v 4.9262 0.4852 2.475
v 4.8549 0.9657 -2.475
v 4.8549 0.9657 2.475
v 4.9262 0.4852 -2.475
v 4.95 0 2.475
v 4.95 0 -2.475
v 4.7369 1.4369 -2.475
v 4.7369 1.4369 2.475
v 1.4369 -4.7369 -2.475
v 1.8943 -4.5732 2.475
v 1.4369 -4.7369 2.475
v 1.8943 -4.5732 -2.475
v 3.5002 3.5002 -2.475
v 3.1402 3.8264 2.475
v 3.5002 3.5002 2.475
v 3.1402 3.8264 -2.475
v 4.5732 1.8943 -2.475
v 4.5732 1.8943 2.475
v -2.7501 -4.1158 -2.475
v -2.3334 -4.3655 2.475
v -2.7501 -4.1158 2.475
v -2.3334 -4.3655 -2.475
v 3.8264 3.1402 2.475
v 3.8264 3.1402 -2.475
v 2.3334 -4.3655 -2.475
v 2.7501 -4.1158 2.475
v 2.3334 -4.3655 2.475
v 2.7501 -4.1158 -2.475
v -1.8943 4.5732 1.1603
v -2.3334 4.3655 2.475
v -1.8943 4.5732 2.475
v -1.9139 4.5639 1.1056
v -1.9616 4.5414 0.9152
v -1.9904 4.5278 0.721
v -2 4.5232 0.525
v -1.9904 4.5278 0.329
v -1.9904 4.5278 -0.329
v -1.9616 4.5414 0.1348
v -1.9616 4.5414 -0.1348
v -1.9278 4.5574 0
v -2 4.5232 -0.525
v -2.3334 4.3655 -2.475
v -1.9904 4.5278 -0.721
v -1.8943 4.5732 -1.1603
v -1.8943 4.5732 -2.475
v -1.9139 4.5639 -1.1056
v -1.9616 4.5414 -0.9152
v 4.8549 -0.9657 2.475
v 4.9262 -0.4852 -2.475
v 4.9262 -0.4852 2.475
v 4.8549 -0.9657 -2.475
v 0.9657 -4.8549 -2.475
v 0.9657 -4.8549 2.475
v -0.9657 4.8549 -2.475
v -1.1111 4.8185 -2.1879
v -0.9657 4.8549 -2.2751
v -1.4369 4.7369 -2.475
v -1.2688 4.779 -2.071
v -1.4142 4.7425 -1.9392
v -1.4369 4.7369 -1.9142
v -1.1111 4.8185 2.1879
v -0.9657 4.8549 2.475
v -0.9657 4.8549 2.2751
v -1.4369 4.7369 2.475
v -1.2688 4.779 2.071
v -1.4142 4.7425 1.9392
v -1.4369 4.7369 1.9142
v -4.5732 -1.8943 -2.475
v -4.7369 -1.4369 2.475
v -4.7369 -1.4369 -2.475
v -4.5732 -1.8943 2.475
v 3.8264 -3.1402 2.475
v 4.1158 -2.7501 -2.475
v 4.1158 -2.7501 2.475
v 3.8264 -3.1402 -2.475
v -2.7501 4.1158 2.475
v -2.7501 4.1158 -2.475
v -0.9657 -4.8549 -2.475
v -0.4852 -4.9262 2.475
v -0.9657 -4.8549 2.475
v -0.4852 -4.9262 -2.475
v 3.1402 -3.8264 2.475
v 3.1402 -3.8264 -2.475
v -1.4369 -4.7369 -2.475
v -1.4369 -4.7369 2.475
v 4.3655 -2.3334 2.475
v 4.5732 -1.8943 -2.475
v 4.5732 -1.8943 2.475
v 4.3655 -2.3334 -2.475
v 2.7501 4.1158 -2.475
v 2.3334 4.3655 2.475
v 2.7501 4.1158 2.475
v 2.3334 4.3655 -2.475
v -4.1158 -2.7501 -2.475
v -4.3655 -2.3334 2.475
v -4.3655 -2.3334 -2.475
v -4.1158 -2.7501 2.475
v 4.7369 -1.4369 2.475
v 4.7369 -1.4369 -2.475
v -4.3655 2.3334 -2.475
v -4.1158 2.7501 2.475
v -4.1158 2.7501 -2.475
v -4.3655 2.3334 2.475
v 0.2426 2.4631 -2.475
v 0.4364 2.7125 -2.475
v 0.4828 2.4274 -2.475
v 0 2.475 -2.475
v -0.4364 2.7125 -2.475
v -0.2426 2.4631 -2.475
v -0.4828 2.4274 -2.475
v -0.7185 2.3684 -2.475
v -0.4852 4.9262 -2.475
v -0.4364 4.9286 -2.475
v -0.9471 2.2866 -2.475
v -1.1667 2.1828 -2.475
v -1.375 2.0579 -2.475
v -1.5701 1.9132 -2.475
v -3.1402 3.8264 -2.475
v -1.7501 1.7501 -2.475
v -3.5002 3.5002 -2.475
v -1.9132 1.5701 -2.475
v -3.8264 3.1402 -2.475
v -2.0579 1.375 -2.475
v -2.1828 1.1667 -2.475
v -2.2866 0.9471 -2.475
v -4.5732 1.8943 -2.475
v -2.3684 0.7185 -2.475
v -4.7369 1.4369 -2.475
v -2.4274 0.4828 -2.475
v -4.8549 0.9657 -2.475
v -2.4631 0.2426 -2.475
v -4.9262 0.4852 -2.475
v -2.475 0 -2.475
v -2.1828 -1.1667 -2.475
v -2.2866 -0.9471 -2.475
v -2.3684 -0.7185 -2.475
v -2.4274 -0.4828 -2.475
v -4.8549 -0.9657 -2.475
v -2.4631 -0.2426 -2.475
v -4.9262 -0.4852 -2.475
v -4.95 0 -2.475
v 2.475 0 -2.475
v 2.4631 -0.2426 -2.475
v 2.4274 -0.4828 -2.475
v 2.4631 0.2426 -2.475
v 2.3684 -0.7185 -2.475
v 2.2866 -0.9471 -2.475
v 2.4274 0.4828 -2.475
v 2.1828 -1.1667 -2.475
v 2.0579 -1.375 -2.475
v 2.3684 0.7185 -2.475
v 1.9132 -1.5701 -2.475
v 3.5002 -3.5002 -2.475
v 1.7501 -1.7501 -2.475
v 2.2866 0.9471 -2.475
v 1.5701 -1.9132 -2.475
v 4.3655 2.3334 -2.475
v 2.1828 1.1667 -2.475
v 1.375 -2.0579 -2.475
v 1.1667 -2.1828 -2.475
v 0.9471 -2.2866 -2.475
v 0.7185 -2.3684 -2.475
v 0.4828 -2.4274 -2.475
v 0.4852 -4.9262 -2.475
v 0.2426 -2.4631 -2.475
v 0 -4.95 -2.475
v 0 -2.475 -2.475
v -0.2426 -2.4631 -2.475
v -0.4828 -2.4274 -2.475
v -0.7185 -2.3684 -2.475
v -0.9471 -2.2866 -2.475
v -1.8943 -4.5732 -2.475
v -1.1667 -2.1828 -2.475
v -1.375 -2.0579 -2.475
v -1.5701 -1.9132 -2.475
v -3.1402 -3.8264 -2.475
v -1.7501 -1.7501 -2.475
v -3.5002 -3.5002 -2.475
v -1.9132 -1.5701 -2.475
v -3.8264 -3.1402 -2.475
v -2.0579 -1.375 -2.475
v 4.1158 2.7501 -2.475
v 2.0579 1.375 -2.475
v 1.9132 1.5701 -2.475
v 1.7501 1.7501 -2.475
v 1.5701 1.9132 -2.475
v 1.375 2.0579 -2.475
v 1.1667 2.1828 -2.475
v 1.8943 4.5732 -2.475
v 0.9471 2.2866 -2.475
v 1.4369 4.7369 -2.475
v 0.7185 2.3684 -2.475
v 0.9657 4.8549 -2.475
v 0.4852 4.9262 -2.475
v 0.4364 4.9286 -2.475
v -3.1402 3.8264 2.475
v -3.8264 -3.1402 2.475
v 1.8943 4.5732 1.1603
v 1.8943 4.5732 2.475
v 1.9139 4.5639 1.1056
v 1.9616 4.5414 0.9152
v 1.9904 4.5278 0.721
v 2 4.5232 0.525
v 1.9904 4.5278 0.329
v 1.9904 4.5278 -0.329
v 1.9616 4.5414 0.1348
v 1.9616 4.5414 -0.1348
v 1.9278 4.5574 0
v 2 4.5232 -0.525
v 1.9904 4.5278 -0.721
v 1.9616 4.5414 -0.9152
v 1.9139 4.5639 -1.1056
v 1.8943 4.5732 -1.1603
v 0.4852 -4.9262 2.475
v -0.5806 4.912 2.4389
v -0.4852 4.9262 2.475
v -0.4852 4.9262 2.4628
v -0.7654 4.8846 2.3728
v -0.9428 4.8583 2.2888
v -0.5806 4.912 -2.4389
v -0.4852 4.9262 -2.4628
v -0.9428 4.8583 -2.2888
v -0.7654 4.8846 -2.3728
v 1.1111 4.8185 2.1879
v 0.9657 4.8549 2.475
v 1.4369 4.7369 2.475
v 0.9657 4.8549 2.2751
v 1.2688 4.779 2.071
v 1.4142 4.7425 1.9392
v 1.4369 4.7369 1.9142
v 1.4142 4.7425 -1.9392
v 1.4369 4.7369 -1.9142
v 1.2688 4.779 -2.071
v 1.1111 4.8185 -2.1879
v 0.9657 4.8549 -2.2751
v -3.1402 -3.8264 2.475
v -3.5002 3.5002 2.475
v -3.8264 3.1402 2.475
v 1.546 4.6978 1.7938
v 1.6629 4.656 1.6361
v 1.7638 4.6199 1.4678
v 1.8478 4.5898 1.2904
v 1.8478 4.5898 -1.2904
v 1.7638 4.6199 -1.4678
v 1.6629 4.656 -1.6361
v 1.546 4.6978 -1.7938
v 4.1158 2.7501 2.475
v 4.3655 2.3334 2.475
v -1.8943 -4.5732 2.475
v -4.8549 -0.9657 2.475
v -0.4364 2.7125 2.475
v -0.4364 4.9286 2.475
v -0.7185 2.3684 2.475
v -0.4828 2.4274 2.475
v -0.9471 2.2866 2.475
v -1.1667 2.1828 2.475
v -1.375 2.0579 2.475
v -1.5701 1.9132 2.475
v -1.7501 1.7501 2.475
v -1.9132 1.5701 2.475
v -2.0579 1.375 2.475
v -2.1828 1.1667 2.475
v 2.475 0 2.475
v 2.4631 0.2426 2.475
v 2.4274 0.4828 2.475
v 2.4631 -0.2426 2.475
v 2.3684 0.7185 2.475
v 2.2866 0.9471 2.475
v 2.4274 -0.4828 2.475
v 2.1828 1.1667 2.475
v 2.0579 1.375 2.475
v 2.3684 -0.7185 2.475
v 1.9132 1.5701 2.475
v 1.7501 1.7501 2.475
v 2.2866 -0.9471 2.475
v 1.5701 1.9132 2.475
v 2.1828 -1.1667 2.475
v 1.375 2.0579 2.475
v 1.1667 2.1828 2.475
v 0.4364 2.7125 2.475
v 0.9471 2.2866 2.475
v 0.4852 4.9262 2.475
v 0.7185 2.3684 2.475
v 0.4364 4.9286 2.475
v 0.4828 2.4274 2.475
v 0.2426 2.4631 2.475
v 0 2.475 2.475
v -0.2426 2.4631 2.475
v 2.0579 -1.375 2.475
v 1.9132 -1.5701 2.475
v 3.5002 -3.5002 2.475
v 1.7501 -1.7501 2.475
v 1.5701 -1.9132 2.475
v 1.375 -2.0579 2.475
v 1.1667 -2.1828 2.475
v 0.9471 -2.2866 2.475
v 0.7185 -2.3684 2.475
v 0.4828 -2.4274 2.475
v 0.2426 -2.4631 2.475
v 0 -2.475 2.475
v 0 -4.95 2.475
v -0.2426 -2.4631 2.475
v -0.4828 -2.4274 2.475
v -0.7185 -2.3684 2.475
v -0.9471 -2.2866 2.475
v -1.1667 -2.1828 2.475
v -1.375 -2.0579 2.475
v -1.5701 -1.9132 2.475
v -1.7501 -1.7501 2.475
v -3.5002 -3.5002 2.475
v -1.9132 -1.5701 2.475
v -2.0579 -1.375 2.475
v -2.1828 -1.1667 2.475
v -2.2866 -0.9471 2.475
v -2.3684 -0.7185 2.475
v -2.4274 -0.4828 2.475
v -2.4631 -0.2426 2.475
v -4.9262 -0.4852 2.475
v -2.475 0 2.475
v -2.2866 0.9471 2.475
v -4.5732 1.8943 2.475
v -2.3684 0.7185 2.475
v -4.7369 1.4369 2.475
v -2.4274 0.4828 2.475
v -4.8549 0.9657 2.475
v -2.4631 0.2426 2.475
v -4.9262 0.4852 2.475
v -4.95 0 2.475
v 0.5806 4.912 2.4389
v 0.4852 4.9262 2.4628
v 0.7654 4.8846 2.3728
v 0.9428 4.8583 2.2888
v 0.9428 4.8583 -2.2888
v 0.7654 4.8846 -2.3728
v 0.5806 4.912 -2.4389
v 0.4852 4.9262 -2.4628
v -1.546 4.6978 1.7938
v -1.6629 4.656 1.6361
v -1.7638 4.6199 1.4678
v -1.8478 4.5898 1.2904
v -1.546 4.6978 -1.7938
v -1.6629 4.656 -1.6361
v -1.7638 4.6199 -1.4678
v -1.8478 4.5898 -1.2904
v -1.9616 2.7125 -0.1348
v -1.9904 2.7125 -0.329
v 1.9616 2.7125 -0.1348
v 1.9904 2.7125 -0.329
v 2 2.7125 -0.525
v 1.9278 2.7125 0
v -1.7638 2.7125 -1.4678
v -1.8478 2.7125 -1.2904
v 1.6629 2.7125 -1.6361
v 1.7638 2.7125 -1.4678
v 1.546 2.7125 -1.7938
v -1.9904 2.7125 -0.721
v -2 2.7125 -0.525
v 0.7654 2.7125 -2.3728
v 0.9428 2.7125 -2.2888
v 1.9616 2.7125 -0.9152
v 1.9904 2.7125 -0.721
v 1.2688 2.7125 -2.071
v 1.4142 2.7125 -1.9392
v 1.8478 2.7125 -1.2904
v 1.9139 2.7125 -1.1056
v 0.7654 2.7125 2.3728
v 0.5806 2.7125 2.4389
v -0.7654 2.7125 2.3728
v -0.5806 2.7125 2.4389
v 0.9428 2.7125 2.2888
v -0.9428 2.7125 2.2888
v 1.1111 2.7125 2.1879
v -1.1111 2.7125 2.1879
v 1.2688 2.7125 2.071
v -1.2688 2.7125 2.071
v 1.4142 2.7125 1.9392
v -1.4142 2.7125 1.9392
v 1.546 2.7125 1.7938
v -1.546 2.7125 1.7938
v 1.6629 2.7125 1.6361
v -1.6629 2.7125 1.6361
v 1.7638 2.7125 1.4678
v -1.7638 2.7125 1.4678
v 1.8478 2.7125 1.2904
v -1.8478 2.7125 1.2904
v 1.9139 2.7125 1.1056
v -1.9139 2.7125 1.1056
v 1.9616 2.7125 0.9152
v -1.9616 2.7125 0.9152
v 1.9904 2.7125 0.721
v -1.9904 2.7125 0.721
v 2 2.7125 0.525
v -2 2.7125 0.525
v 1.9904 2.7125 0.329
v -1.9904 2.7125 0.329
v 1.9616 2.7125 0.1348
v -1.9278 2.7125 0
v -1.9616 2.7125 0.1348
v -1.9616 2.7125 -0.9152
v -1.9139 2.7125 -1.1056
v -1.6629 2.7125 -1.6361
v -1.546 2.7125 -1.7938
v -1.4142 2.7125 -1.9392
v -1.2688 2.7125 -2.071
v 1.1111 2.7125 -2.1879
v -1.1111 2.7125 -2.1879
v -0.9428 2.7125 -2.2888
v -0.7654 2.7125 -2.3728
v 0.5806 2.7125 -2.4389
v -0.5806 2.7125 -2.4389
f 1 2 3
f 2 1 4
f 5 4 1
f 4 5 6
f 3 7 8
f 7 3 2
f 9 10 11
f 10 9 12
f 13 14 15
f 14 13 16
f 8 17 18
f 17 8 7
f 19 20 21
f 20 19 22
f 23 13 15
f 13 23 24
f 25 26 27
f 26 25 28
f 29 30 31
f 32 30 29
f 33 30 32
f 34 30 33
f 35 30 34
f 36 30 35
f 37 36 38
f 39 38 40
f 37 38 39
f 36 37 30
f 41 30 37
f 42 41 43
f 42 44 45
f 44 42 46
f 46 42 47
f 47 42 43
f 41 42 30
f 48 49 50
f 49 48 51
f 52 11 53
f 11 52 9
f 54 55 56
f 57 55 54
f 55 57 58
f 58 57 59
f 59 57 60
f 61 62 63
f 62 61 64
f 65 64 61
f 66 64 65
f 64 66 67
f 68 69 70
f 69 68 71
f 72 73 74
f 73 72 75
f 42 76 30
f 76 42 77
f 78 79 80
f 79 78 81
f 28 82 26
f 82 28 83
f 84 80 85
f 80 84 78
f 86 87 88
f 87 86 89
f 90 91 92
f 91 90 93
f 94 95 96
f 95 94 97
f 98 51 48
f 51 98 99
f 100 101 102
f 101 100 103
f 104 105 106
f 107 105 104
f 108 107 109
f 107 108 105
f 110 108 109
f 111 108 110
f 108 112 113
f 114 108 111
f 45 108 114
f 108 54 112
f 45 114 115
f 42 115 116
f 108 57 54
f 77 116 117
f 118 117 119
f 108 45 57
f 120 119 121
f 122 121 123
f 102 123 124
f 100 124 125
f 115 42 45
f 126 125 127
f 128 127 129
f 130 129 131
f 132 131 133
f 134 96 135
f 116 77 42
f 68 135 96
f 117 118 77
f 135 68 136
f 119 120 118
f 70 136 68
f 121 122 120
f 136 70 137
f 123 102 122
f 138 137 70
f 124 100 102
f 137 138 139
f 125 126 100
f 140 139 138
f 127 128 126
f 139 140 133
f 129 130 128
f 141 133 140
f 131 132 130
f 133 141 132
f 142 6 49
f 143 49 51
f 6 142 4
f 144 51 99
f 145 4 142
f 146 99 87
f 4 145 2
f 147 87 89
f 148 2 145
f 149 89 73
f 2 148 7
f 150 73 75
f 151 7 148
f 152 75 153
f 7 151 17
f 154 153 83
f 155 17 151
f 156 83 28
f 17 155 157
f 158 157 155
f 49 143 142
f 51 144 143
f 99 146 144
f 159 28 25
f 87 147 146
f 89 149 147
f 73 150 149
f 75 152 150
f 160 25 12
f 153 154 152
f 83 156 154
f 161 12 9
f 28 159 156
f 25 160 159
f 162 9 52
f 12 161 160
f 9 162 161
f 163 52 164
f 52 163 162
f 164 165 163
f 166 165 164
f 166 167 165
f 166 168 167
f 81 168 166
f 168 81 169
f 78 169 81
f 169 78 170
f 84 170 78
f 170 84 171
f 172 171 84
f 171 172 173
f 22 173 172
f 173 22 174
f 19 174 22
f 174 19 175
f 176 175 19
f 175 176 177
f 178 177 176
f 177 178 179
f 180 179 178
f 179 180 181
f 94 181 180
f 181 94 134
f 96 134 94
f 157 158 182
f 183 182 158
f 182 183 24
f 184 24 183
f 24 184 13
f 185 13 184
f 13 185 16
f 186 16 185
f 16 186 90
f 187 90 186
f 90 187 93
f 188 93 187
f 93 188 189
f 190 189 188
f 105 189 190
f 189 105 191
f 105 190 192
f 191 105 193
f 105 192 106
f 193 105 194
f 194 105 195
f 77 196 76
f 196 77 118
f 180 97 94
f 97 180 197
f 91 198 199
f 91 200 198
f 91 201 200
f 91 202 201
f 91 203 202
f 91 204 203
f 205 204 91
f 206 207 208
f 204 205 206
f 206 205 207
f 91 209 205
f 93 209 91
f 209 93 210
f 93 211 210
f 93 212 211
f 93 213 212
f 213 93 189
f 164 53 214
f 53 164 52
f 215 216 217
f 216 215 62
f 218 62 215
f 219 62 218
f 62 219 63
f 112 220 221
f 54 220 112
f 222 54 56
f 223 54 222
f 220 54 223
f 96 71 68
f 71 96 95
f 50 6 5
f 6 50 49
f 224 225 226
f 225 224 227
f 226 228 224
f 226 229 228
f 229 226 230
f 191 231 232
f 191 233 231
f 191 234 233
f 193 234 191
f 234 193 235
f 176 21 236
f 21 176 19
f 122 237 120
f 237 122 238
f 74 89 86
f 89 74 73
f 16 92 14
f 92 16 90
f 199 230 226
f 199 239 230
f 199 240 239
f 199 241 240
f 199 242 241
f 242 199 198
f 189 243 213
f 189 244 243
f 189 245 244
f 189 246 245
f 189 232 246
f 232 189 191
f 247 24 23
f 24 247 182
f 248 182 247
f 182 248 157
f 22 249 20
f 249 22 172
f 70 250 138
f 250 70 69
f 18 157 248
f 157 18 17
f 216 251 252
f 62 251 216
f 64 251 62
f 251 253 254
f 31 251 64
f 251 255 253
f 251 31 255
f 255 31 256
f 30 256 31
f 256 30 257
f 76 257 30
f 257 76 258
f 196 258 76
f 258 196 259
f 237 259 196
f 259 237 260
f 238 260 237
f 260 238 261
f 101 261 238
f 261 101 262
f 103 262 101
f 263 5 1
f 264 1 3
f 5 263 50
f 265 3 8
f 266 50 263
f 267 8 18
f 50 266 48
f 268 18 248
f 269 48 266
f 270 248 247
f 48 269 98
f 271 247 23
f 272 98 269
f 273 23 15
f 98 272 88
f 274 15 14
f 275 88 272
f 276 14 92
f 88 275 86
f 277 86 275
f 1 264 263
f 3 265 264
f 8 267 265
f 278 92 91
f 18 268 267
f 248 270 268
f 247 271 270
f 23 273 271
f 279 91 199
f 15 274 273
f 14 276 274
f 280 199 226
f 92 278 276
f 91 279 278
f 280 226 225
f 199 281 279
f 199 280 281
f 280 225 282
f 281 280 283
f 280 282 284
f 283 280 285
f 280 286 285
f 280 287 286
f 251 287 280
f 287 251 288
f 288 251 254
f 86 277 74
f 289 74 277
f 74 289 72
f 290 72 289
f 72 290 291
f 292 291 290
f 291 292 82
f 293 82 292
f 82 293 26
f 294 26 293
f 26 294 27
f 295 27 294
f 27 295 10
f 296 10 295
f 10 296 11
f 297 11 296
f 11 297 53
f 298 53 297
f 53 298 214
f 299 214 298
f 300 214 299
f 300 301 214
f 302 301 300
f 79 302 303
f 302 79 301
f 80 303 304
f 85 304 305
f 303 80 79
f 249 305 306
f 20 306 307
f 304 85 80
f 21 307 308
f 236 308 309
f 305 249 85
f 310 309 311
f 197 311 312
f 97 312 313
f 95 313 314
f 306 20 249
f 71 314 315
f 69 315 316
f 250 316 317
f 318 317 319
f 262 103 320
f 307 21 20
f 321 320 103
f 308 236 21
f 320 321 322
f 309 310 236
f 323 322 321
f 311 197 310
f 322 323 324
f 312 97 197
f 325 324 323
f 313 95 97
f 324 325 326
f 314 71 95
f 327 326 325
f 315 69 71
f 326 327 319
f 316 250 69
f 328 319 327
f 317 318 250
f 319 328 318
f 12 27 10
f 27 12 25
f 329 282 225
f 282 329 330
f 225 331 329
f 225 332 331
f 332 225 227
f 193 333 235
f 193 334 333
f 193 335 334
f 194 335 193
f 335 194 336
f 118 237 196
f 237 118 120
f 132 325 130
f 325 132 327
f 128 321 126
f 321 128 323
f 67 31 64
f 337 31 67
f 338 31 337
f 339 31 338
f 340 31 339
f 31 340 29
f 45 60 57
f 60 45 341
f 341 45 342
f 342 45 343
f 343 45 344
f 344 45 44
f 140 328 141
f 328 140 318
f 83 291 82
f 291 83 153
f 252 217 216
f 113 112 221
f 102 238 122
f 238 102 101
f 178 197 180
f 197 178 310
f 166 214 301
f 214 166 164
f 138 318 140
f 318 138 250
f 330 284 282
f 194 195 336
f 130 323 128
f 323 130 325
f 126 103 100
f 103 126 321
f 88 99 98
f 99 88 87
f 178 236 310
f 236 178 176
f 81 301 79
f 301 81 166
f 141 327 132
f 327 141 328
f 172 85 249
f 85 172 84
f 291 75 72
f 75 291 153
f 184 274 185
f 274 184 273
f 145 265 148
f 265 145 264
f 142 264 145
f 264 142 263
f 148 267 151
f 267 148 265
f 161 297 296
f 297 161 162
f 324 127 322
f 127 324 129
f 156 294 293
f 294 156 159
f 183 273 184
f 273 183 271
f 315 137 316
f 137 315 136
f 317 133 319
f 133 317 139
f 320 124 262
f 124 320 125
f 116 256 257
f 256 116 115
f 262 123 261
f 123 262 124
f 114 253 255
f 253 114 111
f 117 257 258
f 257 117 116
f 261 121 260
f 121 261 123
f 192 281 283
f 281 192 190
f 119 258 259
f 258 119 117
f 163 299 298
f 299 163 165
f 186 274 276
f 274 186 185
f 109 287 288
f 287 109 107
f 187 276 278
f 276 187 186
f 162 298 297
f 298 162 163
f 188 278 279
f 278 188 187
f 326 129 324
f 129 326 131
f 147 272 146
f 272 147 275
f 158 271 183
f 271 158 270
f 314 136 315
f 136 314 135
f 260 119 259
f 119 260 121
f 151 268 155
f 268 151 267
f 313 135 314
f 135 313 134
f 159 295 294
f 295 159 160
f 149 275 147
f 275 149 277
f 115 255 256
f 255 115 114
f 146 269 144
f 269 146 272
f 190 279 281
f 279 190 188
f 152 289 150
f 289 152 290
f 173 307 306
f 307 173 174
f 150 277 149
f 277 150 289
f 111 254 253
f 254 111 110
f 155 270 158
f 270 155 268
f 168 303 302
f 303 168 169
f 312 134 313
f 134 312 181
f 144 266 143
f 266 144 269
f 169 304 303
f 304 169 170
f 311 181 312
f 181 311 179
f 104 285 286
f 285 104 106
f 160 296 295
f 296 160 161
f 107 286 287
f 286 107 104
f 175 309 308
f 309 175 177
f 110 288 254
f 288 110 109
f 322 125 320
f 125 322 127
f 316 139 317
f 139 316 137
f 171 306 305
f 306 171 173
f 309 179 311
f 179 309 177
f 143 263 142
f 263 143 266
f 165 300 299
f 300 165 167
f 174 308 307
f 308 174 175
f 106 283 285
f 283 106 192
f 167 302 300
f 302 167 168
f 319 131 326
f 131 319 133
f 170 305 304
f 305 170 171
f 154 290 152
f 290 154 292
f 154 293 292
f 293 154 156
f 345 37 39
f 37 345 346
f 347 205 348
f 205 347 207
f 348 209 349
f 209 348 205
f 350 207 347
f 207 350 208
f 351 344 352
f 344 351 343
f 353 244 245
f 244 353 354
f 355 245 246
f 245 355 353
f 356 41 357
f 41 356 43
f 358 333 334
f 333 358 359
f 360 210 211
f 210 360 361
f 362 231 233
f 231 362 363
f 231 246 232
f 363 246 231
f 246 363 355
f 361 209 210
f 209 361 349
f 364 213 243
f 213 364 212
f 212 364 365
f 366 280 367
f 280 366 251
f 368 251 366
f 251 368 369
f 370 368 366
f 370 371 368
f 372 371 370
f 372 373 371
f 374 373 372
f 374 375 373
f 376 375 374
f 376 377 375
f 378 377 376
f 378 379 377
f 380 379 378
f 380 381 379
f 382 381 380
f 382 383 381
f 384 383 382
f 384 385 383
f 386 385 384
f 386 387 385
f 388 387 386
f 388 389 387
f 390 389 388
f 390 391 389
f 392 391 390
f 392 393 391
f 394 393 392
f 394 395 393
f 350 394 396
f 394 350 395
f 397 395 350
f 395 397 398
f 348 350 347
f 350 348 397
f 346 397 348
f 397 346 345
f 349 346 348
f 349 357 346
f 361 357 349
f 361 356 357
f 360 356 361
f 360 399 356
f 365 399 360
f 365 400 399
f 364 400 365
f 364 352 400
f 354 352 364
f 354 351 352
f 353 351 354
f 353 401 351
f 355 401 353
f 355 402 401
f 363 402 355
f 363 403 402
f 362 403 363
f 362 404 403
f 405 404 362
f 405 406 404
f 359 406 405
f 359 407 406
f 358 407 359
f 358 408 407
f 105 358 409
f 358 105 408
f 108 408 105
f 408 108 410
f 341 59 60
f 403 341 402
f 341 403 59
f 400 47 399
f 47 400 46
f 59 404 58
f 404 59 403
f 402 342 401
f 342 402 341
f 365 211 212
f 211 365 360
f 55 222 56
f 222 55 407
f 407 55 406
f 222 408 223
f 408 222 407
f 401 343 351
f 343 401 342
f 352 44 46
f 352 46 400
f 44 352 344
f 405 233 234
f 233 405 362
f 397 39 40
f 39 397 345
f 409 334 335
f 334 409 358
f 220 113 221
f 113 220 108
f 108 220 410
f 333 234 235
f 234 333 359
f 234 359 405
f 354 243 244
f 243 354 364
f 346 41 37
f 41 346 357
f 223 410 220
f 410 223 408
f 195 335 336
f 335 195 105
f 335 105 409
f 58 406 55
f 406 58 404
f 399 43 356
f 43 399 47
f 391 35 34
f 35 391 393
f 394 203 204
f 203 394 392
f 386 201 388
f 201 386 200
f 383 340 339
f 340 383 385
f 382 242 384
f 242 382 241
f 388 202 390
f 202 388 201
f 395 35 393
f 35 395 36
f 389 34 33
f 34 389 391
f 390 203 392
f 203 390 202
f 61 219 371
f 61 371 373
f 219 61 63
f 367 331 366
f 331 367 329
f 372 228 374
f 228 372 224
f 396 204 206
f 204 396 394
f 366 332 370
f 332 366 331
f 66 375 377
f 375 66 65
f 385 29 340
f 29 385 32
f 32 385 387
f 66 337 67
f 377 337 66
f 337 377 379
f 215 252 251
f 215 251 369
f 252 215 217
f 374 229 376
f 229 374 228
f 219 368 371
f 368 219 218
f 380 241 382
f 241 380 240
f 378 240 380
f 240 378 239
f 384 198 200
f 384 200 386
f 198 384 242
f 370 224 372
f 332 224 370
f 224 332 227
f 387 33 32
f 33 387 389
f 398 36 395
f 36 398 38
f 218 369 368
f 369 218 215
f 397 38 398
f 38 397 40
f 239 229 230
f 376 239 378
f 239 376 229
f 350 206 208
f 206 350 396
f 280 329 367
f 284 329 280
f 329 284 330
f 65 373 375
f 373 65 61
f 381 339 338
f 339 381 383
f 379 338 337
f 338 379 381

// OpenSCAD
// COBRA Vertebra - C4 V3
// Height: 4.95mm, OD: 9.9mm

$fn = 64;

difference() {
    // Outer cylinder
    cylinder(h=4.95, d=9.9, center=true);
    
    // Inner channel
    cylinder(h=6.95, d=4.95, center=true);

    // Pivot holes
    translate([0, 4.95, -0.5249999999999999])
    rotate([90, 0, 0])
    cylinder(h=4.475, d=4, center=true);
    
    translate([0, 4.95, 0.5249999999999999])
    rotate([90, 0, 0])
    cylinder(h=4.475, d=4, center=true);
}
